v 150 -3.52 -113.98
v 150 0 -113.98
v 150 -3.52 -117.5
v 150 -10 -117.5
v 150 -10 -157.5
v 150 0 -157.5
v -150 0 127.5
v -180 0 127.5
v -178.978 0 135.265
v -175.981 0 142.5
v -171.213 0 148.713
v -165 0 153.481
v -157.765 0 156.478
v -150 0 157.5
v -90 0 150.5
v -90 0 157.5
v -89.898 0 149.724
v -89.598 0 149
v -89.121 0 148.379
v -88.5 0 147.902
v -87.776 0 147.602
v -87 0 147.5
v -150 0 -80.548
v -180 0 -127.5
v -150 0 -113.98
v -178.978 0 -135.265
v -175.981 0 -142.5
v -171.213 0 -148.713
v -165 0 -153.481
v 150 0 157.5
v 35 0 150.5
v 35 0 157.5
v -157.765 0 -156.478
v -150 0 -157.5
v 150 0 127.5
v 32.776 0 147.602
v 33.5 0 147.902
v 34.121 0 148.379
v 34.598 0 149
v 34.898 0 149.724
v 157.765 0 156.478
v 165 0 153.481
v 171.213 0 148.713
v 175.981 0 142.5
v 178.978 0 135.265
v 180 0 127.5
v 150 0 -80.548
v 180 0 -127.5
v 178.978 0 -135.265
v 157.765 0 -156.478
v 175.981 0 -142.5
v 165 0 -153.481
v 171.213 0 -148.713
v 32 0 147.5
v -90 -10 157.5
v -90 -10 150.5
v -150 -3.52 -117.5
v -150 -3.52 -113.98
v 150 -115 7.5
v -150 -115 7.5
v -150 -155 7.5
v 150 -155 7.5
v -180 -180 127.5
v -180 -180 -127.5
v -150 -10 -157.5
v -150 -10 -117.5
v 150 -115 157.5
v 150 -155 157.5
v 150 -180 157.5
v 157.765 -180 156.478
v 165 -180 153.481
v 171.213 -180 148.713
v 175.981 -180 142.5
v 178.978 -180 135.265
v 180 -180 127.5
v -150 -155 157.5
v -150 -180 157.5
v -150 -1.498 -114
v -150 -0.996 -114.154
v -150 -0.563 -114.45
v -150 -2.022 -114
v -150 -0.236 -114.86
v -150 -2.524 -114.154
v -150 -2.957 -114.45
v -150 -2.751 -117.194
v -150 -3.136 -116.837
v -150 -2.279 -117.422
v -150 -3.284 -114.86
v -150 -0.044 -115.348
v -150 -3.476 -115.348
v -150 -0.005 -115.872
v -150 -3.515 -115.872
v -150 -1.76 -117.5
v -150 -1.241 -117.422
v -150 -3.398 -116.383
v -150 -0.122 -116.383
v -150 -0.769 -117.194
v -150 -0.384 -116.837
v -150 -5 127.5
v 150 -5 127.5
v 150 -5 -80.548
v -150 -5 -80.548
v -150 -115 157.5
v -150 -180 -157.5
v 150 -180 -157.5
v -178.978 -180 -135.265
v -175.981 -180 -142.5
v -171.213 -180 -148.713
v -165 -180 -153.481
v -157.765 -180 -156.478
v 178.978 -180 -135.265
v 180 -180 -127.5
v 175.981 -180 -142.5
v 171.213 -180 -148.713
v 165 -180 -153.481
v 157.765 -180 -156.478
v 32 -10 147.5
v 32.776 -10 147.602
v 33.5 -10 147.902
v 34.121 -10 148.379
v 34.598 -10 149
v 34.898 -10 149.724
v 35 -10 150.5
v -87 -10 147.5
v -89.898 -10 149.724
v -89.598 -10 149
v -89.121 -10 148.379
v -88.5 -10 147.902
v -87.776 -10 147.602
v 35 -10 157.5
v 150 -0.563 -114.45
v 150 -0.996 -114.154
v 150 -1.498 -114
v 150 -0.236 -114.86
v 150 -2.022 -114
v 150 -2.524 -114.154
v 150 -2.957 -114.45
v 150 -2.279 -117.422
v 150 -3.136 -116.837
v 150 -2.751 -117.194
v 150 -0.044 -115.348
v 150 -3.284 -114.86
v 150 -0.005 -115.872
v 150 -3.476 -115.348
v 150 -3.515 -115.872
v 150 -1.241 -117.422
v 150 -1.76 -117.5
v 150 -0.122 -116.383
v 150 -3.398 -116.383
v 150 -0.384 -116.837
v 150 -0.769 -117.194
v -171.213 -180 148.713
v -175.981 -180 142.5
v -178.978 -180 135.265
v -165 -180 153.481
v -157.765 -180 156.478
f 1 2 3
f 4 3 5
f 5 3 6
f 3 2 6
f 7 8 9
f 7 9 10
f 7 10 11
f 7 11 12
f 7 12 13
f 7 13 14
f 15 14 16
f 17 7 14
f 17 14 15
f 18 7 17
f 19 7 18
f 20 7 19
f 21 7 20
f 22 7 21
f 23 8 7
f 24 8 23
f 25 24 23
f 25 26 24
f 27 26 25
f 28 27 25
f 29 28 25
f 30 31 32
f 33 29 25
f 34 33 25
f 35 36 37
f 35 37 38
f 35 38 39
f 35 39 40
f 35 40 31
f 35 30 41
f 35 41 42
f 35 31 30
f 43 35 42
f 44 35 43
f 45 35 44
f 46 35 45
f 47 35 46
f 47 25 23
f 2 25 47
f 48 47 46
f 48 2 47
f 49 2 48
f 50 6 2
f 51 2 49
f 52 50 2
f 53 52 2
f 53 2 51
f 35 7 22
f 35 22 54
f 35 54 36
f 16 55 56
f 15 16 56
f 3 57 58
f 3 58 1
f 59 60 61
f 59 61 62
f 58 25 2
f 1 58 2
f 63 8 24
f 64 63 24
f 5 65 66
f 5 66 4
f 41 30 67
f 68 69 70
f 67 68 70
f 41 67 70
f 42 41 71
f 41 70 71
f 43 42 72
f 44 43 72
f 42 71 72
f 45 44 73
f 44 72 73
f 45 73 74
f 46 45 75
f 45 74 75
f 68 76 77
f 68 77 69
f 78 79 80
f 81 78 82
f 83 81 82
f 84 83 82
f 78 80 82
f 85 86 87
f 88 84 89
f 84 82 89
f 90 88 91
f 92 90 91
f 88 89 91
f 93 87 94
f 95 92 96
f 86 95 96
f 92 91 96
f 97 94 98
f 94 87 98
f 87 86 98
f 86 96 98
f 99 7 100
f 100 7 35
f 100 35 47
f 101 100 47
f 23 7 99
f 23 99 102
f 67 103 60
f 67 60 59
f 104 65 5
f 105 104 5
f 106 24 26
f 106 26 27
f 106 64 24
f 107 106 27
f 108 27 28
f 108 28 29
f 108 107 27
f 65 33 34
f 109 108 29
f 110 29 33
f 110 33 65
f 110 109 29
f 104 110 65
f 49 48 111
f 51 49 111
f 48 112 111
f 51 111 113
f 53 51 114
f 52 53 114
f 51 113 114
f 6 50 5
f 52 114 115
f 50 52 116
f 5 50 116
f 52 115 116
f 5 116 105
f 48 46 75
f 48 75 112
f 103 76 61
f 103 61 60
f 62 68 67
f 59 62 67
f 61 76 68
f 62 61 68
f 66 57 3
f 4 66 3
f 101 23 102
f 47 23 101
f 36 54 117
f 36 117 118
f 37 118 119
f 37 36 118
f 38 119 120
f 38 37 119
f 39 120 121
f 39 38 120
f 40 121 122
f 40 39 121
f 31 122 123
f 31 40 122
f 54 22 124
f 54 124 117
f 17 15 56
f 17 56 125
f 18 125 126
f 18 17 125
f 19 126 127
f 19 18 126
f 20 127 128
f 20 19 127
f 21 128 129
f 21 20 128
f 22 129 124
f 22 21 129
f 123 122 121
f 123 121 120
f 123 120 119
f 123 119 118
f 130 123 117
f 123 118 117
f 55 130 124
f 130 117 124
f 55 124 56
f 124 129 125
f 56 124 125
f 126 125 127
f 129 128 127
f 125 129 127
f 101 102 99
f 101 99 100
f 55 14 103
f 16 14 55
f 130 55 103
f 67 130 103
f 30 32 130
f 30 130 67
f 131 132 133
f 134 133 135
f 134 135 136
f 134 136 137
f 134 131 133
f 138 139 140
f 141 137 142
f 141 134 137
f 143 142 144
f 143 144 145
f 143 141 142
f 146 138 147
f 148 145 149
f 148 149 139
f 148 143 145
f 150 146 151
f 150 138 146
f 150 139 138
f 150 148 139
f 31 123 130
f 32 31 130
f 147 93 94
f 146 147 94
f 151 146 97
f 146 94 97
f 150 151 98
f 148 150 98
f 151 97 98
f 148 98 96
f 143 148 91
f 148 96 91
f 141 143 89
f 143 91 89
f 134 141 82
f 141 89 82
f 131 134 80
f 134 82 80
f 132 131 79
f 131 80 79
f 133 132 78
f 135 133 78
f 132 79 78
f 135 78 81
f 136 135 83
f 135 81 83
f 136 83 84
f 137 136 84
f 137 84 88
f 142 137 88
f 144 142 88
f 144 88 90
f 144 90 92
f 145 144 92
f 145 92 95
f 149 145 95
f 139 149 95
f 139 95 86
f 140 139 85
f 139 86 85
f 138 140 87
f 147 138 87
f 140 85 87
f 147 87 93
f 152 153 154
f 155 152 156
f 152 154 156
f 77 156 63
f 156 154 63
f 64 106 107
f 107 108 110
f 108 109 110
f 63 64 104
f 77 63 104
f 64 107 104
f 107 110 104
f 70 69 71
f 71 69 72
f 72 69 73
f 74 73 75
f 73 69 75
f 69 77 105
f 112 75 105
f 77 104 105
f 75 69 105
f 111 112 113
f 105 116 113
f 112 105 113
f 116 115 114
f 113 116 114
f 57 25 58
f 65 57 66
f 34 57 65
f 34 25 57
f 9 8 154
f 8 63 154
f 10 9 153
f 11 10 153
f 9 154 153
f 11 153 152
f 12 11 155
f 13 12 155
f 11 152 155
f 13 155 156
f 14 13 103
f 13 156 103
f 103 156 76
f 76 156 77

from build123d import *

# Parameters (mm, degrees)
SKETCH1_W           = 360
SKETCH1_H           = 315
BASE_FLANGE1_DEPTH  = 180
FILLET1_R           = 30
SKETCH6_W           = 300
SKETCH6_H           = 40
CUT_EXTRUDE1_DEPTH  = 10
CUT_EXTRUDE2_DEPTH  = 10
SKETCH16_W          = 300
SKETCH16_H          = 3.52
CUT_EXTRUDE3_DEPTH  = 3.52
SKETCH17_R          = 1.76
BOSS_EXTRUDE3_DEPTH = 300
SKETCH18_W          = 300
SKETCH18_H          = 40
CUT_EXTRUDE4_DEPTH  = 150
SKETCH22_W          = 300
SKETCH22_H          = 208.048205441
CUT_EXTRUDE6_DEPTH  = 5


# Sheet-metal steps are written as plain solids
with BuildPart() as part:
    # Sketch1 → Base-Flange1 (new body)
    with BuildSketch(Plane(origin=(0, 0, 0), x_dir=(1, 0, 0), z_dir=(0, 1, 0))):
        Rectangle(SKETCH1_W, SKETCH1_H)
    extrude(amount=-BASE_FLANGE1_DEPTH)

    # Fillet1
    fillet1_edges = [part.edges().sort_by_distance(p)[0] for p in [
        (-180, -90, -157.5),
        (180, -90, -157.5),
        (180, -90, 157.5),
        (-180, -90, 157.5),
    ]]
    fillet(fillet1_edges, radius=FILLET1_R)

    # Sketch6 → Cut-Extrude1 (cut)
    with BuildSketch(Plane(origin=(0, 0, 0), x_dir=(1, 0, 0), z_dir=(0, 1, 0))):
        with Locations((0, 137.5)):
            Rectangle(SKETCH6_W, SKETCH6_H)
    extrude(amount=-CUT_EXTRUDE1_DEPTH, mode=Mode.SUBTRACT)

    # Sketch7 → Cut-Extrude2 (cut)
    with BuildSketch(Plane(origin=(0, 0, 0), x_dir=(1, 0, 0), z_dir=(0, 1, 0))):
        with BuildLine():
            Line((-90, -157.5), (-90, -150.5))
            ThreePointArc((-90, -150.5), (-89.121320344, -148.378679656), (-87, -147.5))
            Line((-87, -147.5), (32, -147.5))
            ThreePointArc((32, -147.5), (34.121320344, -148.378679656), (35, -150.5))
            Line((35, -150.5), (35, -157.5))
            Line((35, -157.5), (-90, -157.5))
        make_face()
    extrude(amount=-CUT_EXTRUDE2_DEPTH, mode=Mode.SUBTRACT)

    # Sketch16 → Cut-Extrude3 (cut)
    with BuildSketch(Plane(origin=(0, 0, 0), x_dir=(1, 0, 0), z_dir=(0, 1, 0))):
        with Locations((0, 115.74)):
            Rectangle(SKETCH16_W, SKETCH16_H)
    extrude(amount=-CUT_EXTRUDE3_DEPTH, mode=Mode.SUBTRACT)

    # Sketch18 → Cut-Extrude4 (cut)
    with BuildSketch(Plane.XY.offset(157.5)):
        with Locations((0, -135)):
            Rectangle(SKETCH18_W, SKETCH18_H)
    extrude(amount=-CUT_EXTRUDE4_DEPTH, mode=Mode.SUBTRACT)

    # Sketch22 → Cut-Extrude6 (cut)
    with BuildSketch(Plane(origin=(0, 0, 0), x_dir=(1, 0, 0), z_dir=(0, 1, 0))):
        with Locations((0, -23.47589728)):
            Rectangle(SKETCH22_W, SKETCH22_H)
    extrude(amount=-CUT_EXTRUDE6_DEPTH, mode=Mode.SUBTRACT)


with BuildPart() as body_2:
    # Sketch17 → Boss-Extrude3 (new body)
    with BuildSketch(Plane(origin=(-150, 0, 0), x_dir=(0, 0, -1), z_dir=(1, 0, 0))):
        with Locations((115.74, -1.76)):
            Circle(SKETCH17_R)
    extrude(amount=BOSS_EXTRUDE3_DEPTH)


solid = Compound([part.part, body_2.part])
